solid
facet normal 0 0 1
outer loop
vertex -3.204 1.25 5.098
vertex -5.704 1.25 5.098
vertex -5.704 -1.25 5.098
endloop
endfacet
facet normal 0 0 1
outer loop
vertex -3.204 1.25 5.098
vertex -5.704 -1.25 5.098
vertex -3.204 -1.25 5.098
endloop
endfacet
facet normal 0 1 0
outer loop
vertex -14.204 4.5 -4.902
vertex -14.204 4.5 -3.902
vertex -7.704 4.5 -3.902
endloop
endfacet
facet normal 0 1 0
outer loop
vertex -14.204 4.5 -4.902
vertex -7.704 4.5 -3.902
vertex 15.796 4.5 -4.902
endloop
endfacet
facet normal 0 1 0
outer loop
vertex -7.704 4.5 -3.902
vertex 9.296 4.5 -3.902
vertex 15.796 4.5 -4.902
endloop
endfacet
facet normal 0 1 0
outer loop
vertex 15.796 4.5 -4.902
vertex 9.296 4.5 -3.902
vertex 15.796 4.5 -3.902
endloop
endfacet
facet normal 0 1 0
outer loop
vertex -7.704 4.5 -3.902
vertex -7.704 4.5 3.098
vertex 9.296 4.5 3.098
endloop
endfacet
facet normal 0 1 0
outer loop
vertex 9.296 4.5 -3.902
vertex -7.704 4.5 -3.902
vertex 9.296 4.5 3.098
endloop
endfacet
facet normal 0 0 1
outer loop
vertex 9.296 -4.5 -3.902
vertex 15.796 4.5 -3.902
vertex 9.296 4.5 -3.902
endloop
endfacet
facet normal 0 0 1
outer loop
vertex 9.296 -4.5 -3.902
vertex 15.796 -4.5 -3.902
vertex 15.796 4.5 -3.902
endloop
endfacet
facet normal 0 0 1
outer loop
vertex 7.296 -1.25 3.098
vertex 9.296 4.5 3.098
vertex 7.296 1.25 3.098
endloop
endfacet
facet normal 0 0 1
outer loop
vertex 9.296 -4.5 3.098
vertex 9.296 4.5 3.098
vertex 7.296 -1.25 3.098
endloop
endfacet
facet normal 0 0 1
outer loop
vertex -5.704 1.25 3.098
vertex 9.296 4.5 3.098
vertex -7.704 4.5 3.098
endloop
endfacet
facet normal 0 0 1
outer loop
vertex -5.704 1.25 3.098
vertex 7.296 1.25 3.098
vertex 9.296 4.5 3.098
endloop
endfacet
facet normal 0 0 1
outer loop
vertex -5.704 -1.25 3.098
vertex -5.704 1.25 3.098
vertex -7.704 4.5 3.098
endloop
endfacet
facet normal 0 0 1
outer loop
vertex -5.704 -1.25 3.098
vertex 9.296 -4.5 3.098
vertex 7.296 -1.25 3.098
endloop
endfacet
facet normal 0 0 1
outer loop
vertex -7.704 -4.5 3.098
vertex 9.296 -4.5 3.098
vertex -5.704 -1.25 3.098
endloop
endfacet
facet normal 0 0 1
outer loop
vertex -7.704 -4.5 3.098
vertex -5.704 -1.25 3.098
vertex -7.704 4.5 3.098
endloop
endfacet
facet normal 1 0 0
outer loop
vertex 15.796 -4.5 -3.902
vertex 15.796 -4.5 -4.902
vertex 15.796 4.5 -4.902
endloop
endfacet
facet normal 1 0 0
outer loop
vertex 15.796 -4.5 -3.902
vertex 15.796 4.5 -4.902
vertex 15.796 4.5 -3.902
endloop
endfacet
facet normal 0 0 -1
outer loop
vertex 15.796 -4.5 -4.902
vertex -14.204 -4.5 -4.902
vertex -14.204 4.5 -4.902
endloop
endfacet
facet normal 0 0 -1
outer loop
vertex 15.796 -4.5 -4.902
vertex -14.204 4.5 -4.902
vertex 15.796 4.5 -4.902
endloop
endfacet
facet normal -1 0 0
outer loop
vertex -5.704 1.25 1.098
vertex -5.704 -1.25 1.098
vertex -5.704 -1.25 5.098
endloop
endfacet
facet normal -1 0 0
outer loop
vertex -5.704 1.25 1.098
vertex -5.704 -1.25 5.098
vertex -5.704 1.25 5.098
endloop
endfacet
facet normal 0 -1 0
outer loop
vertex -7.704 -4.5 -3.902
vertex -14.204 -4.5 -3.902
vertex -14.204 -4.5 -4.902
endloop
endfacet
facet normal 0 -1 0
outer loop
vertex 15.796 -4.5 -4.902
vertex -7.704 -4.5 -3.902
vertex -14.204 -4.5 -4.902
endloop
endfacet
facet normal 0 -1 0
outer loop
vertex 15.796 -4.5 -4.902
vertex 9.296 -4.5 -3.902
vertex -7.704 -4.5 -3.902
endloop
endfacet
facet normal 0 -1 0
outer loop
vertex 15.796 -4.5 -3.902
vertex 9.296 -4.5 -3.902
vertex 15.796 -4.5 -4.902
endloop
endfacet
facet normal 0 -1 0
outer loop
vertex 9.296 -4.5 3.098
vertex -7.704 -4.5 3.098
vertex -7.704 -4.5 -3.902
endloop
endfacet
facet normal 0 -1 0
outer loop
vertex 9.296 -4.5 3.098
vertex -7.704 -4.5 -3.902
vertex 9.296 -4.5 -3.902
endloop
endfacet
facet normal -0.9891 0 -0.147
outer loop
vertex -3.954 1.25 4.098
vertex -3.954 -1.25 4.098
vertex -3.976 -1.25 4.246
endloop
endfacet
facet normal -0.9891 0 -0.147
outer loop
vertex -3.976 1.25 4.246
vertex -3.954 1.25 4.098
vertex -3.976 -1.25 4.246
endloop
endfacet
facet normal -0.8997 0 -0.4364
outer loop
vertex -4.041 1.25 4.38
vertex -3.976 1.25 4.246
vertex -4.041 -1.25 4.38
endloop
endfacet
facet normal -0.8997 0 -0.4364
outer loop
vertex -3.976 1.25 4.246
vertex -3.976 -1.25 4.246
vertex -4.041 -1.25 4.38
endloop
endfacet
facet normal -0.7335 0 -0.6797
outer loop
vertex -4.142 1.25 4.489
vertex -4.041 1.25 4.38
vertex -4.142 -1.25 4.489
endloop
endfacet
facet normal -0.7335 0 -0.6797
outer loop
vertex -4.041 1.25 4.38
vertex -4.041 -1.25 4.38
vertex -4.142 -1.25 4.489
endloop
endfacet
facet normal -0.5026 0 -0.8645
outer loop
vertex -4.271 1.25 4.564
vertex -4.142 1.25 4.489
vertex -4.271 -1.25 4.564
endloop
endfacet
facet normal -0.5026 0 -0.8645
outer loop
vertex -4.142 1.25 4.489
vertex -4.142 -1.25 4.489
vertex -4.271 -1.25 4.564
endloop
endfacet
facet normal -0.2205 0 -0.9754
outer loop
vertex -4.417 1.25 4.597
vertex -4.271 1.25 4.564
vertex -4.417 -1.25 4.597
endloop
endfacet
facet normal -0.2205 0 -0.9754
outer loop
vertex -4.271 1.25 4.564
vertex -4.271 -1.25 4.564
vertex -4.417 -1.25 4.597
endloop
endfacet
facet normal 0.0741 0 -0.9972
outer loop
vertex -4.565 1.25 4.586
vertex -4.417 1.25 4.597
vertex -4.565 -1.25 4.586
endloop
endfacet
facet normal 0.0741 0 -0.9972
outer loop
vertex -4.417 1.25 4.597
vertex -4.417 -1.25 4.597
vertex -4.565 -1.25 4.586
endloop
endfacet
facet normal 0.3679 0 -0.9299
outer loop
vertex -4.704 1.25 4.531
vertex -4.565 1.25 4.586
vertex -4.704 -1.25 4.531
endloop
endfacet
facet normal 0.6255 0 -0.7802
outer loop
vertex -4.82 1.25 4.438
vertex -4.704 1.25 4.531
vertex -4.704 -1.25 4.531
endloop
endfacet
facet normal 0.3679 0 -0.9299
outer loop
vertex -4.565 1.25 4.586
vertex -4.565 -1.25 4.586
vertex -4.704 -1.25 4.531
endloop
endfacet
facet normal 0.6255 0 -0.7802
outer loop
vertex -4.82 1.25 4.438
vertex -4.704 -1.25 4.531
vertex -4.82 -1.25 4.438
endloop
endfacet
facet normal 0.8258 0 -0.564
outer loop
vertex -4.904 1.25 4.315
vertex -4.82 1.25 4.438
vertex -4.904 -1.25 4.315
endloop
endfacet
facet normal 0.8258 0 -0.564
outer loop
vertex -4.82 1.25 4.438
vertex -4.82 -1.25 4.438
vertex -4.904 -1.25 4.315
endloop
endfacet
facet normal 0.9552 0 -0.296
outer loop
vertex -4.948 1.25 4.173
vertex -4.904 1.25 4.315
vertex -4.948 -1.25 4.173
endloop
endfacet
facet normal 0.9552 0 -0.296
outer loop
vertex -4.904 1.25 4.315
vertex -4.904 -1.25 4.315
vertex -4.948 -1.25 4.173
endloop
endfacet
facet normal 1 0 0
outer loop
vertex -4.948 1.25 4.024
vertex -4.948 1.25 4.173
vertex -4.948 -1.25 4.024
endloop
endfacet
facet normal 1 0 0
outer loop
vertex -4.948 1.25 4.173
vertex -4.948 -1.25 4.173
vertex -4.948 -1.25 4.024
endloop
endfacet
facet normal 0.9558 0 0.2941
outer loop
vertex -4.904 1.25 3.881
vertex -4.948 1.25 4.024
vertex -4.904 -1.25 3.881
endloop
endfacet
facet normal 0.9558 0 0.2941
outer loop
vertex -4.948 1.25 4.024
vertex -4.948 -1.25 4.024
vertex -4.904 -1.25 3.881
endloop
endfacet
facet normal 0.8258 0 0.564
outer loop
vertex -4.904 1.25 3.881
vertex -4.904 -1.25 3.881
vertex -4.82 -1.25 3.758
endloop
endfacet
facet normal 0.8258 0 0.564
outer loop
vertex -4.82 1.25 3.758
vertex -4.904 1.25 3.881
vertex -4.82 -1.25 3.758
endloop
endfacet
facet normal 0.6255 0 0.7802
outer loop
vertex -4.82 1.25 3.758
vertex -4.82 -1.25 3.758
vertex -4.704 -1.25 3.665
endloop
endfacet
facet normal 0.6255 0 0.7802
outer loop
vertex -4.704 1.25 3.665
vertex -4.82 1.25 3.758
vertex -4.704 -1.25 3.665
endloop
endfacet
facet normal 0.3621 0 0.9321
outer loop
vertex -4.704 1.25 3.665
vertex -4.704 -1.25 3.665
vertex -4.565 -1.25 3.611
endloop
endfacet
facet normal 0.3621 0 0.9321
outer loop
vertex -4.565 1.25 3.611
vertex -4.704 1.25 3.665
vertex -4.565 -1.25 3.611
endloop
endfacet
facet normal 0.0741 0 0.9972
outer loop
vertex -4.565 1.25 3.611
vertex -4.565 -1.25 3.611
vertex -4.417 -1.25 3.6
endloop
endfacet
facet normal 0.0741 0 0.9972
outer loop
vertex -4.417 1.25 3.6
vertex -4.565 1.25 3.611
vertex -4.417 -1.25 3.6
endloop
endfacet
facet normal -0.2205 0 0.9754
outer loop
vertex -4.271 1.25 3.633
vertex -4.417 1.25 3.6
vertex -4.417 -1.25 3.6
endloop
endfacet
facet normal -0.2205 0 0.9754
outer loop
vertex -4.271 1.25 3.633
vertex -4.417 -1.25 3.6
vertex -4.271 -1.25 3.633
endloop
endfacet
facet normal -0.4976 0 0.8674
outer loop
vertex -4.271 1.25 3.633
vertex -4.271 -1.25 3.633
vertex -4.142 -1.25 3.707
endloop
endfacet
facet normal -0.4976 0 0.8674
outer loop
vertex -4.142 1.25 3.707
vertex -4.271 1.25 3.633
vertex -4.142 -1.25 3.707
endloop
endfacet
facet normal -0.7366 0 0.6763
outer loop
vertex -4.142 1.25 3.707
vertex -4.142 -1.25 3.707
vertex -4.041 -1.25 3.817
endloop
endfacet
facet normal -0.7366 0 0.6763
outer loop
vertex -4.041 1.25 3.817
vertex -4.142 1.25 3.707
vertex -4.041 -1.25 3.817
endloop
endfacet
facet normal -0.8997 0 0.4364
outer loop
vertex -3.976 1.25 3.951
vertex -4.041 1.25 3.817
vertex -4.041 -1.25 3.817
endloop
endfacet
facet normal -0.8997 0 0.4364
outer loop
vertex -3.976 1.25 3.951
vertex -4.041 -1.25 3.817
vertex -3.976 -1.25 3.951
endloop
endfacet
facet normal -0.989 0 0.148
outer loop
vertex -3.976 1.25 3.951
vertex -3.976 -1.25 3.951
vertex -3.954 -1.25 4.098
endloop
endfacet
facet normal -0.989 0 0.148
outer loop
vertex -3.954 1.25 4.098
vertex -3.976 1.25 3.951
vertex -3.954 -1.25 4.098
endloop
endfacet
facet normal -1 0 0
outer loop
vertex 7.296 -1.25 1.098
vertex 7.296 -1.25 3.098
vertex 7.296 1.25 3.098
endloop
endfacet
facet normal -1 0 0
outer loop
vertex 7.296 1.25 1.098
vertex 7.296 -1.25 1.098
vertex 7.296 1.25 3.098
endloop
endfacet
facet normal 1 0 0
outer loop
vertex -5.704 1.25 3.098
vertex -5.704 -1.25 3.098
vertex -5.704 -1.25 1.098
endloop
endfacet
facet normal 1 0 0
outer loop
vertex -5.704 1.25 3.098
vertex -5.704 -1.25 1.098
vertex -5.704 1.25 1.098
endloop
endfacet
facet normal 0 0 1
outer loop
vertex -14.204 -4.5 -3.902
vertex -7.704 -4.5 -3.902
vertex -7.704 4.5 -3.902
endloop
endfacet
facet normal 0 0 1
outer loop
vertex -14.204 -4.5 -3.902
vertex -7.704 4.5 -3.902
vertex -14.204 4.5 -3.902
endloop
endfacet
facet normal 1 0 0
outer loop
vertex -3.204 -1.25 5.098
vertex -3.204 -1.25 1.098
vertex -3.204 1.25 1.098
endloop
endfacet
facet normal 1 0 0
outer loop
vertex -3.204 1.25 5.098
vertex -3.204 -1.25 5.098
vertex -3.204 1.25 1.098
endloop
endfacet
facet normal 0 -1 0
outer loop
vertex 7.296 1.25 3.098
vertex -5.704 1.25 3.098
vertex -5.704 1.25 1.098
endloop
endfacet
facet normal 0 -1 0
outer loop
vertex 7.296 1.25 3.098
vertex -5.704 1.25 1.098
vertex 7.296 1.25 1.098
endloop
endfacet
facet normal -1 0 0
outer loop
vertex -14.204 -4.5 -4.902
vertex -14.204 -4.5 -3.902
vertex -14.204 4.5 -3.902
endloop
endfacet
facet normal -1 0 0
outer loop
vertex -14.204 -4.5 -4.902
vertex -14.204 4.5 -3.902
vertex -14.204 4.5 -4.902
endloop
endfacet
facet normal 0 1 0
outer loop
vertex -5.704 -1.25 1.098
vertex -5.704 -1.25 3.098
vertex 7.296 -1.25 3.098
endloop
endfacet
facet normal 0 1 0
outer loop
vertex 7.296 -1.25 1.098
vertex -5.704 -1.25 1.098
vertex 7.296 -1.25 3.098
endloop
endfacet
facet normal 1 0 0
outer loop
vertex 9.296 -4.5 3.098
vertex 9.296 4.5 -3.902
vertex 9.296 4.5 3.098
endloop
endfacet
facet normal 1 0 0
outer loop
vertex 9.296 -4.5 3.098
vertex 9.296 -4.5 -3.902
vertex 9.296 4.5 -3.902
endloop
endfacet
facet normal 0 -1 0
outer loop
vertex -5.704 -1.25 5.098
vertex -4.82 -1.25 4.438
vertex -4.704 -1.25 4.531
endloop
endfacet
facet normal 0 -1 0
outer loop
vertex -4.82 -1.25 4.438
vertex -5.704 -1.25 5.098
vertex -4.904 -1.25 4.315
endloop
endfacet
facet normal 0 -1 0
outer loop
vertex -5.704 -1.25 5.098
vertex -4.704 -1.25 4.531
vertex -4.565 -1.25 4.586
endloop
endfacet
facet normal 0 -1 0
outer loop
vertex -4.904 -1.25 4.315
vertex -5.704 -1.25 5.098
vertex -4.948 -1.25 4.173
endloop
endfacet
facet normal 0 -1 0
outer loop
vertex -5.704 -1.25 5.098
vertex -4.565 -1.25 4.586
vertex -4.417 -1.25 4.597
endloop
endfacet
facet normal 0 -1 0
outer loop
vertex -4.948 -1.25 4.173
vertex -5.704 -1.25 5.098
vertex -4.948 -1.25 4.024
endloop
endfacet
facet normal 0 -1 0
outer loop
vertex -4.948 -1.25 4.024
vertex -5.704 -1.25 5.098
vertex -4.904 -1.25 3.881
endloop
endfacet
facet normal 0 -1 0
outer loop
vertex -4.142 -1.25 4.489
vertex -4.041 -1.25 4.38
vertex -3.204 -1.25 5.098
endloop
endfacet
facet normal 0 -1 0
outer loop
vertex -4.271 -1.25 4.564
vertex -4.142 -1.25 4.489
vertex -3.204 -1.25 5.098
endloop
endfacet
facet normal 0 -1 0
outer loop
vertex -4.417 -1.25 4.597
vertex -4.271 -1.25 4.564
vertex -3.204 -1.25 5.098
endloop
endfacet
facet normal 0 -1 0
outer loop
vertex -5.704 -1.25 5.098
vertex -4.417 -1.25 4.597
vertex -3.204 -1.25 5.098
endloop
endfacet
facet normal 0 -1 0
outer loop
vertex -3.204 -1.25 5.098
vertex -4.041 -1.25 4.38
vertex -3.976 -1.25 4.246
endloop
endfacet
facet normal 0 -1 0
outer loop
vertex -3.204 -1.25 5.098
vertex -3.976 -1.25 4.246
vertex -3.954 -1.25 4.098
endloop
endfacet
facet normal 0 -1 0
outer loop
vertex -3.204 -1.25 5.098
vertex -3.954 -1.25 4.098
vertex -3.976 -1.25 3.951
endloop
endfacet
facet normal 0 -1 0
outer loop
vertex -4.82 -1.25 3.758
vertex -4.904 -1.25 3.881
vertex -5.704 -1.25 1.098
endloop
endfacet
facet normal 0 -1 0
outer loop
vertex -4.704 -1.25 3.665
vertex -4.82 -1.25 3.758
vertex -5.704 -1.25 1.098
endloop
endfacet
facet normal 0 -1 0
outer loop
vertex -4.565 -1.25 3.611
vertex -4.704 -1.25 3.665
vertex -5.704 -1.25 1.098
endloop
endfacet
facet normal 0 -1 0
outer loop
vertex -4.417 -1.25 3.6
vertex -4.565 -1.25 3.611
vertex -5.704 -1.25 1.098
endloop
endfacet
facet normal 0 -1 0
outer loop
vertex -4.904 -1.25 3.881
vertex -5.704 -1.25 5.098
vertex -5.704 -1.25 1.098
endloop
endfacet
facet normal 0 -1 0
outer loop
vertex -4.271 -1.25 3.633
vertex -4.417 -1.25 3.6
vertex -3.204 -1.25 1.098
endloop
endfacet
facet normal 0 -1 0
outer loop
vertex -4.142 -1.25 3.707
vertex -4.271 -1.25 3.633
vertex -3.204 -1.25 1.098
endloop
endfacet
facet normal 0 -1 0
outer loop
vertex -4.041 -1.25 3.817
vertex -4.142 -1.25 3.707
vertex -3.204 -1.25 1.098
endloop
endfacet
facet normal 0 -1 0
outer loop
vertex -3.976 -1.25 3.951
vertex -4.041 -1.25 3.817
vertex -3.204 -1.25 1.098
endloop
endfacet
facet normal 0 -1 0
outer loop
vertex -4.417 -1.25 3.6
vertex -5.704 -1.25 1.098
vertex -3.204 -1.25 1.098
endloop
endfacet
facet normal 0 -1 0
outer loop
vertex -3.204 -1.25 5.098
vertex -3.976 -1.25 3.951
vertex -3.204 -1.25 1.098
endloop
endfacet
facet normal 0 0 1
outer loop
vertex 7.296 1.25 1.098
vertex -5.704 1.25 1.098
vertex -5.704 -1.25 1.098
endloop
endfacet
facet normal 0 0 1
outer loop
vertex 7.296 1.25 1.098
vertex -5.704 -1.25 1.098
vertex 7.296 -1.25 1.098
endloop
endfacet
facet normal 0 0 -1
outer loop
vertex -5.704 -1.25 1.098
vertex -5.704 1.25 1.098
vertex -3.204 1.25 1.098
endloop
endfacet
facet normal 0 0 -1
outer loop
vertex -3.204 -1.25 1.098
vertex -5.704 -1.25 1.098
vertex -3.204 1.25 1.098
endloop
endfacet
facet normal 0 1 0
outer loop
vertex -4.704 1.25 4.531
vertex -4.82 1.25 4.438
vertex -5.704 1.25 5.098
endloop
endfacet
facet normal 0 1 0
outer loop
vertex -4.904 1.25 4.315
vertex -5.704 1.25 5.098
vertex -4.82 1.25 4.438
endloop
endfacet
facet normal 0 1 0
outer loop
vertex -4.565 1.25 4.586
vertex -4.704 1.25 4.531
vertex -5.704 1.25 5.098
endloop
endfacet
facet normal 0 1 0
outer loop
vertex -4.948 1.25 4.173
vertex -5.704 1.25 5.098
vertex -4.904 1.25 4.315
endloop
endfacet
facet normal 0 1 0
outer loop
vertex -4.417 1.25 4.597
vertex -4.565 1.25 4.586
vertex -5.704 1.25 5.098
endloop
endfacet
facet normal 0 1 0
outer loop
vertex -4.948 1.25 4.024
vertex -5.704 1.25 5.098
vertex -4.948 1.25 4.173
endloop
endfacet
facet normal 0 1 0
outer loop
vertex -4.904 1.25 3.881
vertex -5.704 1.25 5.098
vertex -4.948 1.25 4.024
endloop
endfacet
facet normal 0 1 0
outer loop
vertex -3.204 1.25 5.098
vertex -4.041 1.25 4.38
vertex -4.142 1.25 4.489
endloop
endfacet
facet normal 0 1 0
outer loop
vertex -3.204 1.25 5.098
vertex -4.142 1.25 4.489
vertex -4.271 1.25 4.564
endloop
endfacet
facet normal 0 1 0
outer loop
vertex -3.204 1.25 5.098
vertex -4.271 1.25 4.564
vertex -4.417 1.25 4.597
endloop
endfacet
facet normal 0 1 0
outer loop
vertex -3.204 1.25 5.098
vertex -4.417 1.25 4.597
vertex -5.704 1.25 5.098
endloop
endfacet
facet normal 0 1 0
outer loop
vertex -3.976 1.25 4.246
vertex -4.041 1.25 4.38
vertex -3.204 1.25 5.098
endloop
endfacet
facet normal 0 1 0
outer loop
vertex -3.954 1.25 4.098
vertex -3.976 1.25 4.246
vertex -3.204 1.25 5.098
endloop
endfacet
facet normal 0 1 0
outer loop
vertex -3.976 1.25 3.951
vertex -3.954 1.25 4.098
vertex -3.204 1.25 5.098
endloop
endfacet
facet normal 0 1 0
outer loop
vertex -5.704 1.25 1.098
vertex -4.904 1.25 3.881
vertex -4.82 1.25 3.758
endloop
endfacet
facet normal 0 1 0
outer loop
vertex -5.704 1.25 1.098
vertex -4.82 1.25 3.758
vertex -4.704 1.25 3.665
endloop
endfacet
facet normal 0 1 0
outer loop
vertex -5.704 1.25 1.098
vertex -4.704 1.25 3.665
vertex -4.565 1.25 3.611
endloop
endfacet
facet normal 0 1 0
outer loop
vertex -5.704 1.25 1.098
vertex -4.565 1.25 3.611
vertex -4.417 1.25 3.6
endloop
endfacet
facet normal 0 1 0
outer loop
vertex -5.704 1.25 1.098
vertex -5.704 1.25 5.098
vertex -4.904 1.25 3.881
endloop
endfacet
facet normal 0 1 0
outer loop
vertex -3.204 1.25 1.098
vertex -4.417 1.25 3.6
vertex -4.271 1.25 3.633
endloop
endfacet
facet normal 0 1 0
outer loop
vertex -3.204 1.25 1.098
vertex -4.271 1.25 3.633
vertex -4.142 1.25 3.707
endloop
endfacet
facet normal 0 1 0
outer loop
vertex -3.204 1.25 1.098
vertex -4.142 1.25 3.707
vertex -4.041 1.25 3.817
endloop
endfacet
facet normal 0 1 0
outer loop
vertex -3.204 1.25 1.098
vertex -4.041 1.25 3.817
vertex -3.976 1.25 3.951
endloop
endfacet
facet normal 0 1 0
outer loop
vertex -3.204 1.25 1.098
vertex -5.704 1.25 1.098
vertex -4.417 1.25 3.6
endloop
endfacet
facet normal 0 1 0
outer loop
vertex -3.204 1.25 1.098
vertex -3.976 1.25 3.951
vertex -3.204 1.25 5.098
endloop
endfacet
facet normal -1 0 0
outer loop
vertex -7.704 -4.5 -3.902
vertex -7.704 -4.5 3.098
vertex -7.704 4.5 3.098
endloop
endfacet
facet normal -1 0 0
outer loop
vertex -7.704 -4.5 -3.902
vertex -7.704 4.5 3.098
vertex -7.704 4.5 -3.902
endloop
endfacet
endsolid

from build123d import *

# Parameters (mm, degrees)
F1_DEPTH = 4.5
F2_W     = 13
F2_H     = 2.5
F3_DEPTH = 2
F4_W     = 2.5
F4_H     = 2.5
F5_DEPTH = 4
F6_R     = 0.5
F7_DEPTH = 5.751


with BuildPart() as f1:
    # F0 (on Front) → F1 (new body, symmetric)
    with BuildSketch(Plane.XZ):
        Polygon((9.296087, 3.098171), (-7.703913, 3.098171), (-7.703913, -3.901829), (-14.203913, -3.901829), (-14.203913, -4.901829), (15.796087, -4.901829), (15.796087, -3.901829), (9.296087, -3.901829), align=None)
    extrude(amount=F1_DEPTH, both=True)

    # F2 (on face) → F3 (cut)
    with BuildSketch(Plane.XY.offset(3.098171)):
        with Locations((0.796087, 0)):
            Rectangle(F2_W, F2_H)
    extrude(amount=-F3_DEPTH, mode=Mode.SUBTRACT)


with BuildPart() as f5:
    # F4 (on face) → F5 (new body)
    with BuildSketch(Plane.XY.offset(1.098171)):
        with Locations((-4.453913, 0)):
            Rectangle(F4_W, F4_H)
    extrude(amount=F5_DEPTH)

    # F6 (on face) → F7 (cut, through all)
    with BuildSketch(Plane.XZ.offset(1.25)):
        with Locations((-4.453913, 4.098171)):
            Circle(F6_R)
    extrude(amount=-F7_DEPTH, mode=Mode.SUBTRACT)


solid = Compound([f1.part, f5.part])
